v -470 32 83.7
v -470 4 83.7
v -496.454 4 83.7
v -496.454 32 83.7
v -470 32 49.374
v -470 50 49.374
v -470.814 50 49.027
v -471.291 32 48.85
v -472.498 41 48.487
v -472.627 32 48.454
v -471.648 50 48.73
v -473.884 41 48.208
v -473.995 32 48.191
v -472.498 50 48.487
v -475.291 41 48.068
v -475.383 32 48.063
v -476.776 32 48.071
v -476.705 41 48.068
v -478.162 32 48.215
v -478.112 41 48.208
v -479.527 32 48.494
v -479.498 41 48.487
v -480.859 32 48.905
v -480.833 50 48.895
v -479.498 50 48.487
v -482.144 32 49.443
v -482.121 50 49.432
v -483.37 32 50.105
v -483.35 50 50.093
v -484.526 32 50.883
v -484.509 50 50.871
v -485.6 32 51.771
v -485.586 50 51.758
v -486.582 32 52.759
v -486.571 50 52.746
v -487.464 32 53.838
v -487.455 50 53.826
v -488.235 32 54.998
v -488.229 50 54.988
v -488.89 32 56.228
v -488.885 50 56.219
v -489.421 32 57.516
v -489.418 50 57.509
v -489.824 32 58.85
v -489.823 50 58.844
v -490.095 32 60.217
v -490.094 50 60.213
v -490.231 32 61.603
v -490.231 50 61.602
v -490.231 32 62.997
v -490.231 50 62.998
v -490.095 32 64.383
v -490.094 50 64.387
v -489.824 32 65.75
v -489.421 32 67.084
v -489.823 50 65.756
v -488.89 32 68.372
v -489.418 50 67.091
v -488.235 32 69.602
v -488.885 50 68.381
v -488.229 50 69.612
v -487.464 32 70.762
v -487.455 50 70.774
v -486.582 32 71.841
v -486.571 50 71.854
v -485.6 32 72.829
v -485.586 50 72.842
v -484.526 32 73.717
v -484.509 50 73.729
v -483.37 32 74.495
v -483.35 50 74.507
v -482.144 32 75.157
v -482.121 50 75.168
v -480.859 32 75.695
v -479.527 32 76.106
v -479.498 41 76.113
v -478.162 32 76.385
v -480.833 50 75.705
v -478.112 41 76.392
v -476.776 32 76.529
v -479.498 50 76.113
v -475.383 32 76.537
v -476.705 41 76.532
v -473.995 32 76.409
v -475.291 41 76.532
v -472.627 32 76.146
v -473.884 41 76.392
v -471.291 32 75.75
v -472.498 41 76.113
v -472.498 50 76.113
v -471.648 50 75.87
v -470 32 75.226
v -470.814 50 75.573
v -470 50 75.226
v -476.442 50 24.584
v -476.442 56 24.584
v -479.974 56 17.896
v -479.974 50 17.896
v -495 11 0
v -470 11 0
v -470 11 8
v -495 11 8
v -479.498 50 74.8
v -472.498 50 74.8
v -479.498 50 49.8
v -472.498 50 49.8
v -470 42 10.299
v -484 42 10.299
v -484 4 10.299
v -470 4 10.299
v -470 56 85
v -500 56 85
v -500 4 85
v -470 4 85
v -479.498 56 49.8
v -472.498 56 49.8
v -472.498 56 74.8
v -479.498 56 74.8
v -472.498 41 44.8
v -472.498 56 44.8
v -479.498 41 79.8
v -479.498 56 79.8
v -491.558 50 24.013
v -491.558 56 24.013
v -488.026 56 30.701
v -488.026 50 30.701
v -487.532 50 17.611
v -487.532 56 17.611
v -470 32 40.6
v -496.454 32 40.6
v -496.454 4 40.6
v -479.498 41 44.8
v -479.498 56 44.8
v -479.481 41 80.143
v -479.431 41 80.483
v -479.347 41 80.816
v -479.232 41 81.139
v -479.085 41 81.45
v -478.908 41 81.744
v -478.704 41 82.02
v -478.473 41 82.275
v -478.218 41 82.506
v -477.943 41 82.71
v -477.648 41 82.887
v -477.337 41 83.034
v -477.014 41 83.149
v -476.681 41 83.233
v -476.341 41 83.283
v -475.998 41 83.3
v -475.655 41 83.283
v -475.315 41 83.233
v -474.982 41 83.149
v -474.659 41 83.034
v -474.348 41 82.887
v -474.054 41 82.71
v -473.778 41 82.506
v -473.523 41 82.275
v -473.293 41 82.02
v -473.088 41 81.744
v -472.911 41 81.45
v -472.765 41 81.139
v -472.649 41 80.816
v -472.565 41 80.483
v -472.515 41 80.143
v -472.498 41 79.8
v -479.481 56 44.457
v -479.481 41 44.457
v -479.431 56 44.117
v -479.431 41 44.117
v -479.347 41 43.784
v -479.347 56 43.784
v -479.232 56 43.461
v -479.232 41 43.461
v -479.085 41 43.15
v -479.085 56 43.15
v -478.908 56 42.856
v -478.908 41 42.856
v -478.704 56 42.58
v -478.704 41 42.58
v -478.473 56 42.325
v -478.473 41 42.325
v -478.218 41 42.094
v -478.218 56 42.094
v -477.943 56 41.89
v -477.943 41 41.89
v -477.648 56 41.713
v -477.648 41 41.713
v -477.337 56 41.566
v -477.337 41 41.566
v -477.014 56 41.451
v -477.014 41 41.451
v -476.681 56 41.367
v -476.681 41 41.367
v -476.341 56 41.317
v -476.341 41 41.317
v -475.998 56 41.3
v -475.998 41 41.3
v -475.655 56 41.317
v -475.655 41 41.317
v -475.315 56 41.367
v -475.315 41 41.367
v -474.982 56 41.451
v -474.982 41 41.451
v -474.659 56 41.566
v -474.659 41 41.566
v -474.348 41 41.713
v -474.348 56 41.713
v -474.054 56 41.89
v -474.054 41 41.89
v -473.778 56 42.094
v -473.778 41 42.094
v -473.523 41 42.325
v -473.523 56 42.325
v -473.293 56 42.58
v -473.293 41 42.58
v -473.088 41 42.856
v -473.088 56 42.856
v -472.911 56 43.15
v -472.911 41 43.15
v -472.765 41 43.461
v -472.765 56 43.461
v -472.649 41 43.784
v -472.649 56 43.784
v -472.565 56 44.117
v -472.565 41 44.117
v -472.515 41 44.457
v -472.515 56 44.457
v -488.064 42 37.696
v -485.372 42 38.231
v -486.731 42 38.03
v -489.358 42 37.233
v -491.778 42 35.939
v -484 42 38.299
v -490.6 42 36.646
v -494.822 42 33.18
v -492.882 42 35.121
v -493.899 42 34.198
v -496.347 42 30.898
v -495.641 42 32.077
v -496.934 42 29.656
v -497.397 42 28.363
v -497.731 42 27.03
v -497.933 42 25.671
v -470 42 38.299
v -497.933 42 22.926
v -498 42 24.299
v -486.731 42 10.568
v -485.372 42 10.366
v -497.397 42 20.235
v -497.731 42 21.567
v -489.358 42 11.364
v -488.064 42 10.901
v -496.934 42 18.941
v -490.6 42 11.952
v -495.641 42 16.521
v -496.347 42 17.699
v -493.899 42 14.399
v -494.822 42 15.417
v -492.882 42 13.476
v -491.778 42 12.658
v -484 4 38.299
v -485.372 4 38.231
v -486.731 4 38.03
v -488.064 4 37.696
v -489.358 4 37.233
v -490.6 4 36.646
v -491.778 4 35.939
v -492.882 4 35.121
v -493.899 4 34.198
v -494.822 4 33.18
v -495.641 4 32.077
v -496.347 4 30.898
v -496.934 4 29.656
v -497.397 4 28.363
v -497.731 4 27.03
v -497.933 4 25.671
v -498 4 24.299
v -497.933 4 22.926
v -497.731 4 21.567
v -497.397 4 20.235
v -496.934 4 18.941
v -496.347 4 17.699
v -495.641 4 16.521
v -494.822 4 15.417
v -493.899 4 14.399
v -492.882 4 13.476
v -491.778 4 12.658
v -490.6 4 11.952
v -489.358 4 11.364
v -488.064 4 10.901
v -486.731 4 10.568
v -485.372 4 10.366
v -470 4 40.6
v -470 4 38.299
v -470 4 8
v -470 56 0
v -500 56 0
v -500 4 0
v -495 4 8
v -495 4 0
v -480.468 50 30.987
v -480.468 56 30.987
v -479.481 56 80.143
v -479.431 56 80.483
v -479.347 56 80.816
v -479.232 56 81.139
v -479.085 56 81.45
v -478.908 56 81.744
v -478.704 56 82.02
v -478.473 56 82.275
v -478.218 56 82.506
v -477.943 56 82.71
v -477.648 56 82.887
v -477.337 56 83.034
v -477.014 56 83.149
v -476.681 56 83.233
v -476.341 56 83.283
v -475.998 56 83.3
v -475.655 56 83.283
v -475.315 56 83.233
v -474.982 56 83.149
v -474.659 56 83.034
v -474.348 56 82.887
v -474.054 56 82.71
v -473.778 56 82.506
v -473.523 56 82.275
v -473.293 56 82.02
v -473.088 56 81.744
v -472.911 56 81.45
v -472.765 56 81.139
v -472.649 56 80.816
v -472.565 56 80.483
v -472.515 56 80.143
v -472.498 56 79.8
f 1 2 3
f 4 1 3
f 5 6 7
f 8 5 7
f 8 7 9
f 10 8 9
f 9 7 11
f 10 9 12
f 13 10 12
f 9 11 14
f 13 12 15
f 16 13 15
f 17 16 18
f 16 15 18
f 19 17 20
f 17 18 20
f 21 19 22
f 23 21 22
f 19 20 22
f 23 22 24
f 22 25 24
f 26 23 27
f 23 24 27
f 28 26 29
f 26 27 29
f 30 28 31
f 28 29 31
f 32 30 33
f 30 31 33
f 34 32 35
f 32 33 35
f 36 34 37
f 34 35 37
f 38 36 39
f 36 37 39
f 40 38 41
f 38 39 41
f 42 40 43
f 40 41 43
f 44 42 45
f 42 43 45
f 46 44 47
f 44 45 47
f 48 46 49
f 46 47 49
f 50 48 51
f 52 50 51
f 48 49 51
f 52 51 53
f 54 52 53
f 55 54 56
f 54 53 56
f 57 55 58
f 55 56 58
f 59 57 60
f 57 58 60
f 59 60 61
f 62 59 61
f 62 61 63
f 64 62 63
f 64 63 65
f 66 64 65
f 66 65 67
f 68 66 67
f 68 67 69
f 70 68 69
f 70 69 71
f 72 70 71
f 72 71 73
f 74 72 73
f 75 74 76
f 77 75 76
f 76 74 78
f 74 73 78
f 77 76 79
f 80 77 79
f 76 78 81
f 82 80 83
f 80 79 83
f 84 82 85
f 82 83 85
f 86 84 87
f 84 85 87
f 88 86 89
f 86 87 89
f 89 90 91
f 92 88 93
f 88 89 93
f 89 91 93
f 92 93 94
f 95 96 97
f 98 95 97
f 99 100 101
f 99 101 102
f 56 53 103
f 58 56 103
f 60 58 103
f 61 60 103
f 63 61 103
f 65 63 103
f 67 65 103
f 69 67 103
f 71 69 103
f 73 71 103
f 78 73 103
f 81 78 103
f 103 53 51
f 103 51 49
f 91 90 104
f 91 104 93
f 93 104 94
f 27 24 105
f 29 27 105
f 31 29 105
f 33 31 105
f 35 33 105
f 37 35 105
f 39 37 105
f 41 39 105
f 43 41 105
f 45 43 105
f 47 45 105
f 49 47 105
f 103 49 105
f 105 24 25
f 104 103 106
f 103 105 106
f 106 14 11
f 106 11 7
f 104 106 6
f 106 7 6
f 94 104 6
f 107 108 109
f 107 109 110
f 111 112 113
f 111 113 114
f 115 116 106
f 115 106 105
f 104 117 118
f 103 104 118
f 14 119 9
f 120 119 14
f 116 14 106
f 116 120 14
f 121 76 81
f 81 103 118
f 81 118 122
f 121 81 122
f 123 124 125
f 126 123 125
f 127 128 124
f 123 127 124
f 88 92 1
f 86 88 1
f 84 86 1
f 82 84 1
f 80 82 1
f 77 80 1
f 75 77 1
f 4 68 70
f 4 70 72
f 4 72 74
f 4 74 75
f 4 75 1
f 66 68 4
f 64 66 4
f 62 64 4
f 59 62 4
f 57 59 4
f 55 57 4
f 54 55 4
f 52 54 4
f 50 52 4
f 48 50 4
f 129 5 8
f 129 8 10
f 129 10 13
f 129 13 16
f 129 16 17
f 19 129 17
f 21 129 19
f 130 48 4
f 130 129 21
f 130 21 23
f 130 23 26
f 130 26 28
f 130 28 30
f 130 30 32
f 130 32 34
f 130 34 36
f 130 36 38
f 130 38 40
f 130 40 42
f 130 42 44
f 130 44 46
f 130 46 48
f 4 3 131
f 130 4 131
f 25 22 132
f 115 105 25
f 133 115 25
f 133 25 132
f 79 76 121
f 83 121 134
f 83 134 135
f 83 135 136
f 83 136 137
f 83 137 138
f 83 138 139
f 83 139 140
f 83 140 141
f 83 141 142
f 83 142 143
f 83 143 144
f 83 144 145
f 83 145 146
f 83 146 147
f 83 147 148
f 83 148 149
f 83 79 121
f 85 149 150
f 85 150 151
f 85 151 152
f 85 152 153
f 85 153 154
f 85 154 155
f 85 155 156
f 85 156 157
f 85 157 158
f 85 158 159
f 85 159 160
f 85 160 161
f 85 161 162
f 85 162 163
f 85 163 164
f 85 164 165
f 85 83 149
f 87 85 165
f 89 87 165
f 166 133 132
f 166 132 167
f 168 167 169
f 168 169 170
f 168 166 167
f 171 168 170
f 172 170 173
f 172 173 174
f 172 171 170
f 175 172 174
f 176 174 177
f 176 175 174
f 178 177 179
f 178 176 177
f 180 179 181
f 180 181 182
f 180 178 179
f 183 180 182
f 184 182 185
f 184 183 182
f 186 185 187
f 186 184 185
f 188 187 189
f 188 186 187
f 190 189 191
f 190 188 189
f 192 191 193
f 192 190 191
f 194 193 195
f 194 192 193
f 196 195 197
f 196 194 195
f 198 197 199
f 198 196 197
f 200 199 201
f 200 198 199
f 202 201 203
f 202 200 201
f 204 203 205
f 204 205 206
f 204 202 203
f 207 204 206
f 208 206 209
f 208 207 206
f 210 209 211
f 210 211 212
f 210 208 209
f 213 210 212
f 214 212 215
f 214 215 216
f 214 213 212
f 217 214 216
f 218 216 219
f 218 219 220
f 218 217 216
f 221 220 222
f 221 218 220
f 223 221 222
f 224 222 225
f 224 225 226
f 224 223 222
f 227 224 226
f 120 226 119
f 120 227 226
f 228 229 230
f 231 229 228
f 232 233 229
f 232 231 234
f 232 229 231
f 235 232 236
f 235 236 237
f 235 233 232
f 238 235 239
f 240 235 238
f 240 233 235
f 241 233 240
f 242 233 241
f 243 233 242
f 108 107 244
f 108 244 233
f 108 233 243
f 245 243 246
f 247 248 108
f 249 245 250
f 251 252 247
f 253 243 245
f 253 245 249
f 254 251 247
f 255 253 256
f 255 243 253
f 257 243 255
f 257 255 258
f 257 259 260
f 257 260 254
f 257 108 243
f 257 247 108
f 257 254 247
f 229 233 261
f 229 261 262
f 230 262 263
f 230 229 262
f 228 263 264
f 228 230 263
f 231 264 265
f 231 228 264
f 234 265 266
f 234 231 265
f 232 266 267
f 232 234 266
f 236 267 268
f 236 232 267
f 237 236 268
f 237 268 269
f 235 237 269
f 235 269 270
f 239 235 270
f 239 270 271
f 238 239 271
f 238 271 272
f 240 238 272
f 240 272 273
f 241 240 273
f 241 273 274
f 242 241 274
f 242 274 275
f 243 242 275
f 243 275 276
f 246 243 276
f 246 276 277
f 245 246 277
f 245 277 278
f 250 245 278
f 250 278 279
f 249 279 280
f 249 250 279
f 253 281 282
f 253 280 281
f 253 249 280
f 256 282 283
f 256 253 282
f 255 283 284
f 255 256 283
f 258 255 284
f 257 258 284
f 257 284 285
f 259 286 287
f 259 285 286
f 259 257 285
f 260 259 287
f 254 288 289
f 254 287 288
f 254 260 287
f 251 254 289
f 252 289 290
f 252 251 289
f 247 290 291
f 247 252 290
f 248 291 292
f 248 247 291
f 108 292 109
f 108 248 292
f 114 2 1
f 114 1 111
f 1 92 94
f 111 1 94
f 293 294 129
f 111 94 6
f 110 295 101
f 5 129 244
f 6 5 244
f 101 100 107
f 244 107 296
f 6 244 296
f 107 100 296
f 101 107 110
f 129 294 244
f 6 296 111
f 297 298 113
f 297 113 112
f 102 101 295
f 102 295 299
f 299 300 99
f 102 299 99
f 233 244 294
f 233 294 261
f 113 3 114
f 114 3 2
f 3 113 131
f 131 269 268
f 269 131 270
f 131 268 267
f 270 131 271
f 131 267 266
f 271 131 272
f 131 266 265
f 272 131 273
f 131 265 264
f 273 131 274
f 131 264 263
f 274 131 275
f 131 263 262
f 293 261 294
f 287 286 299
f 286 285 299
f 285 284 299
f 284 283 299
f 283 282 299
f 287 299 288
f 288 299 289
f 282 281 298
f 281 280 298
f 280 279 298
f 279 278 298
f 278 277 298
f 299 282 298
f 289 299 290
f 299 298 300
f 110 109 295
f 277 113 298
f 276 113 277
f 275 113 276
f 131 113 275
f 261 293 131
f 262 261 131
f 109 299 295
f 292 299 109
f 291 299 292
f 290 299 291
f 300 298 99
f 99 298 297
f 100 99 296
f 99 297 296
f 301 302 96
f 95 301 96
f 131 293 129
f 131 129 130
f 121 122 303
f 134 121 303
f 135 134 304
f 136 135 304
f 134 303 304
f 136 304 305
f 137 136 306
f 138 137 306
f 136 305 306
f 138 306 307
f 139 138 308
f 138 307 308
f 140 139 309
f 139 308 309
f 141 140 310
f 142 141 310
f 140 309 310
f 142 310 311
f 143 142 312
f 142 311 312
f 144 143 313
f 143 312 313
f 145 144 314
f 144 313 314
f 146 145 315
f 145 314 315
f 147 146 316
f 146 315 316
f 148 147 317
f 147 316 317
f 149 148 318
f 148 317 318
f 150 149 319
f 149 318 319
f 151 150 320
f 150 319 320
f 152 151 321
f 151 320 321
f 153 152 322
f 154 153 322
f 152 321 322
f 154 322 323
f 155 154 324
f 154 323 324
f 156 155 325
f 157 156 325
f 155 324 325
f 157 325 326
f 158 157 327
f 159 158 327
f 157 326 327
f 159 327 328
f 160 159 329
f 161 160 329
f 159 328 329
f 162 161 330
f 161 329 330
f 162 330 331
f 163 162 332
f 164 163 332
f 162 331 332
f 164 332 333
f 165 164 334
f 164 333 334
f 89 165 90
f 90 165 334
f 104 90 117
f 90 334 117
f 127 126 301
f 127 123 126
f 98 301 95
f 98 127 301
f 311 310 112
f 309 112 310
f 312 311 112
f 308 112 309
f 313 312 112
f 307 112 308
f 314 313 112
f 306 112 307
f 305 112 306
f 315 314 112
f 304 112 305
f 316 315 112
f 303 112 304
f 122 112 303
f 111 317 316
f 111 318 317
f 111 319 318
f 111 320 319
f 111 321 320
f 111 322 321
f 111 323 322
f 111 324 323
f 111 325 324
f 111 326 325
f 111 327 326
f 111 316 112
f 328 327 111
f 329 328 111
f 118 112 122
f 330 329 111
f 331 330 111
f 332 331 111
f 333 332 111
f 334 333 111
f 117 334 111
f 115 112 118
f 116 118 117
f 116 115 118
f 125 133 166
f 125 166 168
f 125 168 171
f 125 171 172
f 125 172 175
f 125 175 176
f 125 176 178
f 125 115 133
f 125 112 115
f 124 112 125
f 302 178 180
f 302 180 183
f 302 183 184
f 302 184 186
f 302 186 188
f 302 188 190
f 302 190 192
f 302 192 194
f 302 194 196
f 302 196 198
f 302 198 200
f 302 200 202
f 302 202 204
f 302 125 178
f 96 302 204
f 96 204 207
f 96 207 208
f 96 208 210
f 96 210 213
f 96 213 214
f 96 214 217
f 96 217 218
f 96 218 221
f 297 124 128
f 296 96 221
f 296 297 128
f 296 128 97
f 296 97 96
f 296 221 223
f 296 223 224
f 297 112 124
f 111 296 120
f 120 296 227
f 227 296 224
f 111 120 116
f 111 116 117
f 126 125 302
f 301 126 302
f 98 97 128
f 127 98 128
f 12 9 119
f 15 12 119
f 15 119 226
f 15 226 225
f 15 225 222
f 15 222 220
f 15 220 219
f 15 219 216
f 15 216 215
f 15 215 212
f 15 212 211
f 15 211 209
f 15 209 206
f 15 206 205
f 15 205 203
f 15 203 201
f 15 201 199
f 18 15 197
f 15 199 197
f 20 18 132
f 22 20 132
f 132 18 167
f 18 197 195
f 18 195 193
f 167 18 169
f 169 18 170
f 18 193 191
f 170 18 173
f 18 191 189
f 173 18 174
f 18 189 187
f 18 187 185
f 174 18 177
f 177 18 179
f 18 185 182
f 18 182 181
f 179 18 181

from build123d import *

# Parameters (mm, degrees)
SKETCH1_W           = 30
SKETCH1_H           = 52
BOSS_EXTRUDE1_DEPTH = 85
SKETCH2_R           = 14.25
CUT_EXTRUDE1_DEPTH  = 51
SKETCH3_R           = 11.218089099
CUT_EXTRUDE2_DEPTH  = 27
CUT_EXTRUDE3_DEPTH  = 6
CUT_EXTRUDE4_DEPTH  = 15
SKETCH4_W           = 26.454461606
SKETCH4_H           = 43.1
CUT_EXTRUDE5_DEPTH  = 28
CUT_EXTRUDE6_DEPTH  = 46
SKETCH8_W           = 25
SKETCH8_H           = 7
CUT_EXTRUDE7_DEPTH  = 8


with BuildPart() as part:
    # Sketch1 → Boss-Extrude1 (new body)
    with BuildSketch(Plane.XY):
        with Locations((-485, 30)):
            Rectangle(SKETCH1_W, SKETCH1_H)
    extrude(amount=BOSS_EXTRUDE1_DEPTH)

    # Sketch2 → Cut-Extrude1 (cut)
    with BuildSketch(Plane(origin=(0, 50, 0), x_dir=(1, 0, 0), z_dir=(0, 1, 0))):
        with Locations((-475.99810076, -62.3)):
            Circle(SKETCH2_R)
    extrude(amount=-CUT_EXTRUDE1_DEPTH, mode=Mode.SUBTRACT)

    # Sketch3 → Cut-Extrude2 (cut)
    with BuildSketch(Plane.XZ.offset(-4)):
        with Locations((-483.99810076, 62.3)):
            Circle(SKETCH3_R)
    extrude(amount=-CUT_EXTRUDE2_DEPTH, mode=Mode.SUBTRACT)

    # Sketch5 → Cut-Extrude3 (cut)
    with BuildSketch(Plane(origin=(0, 56, 0), x_dir=(1, 0, 0), z_dir=(0, 1, 0))):
        Polygon((-488.026219091, -30.701179091), (-480.468321914, -30.986702473), (-476.442102823, -24.584133211), (-479.973780909, -17.896040565), (-487.531678086, -17.610517183), (-491.557897177, -24.013086446), align=None)
    extrude(amount=-CUT_EXTRUDE3_DEPTH, mode=Mode.SUBTRACT)

    # Sketch6 → Cut-Extrude4 (cut)
    with BuildSketch(Plane(origin=(0, 56, 0), x_dir=(1, 0, 0), z_dir=(0, 1, 0))):
        with BuildLine():
            Line((-472.49810076, -79.8), (-472.49810076, -74.8))
            Line((-472.49810076, -74.8), (-479.49810076, -74.8))
            Line((-479.49810076, -74.8), (-479.49810076, -79.8))
            ThreePointArc((-479.49810076, -79.8), (-475.99810076, -83.3), (-472.49810076, -79.8))
        make_face()
        with BuildLine():
            Line((-472.49810076, -44.8), (-472.49810076, -49.8))
            Line((-472.49810076, -49.8), (-479.49810076, -49.8))
            Line((-479.49810076, -49.8), (-479.49810076, -44.8))
            ThreePointArc((-479.49810076, -44.8), (-475.99810076, -41.3), (-472.49810076, -44.8))
        make_face()
    extrude(amount=-CUT_EXTRUDE4_DEPTH, mode=Mode.SUBTRACT)

    # Sketch4 → Cut-Extrude5 (cut)
    with BuildSketch(Plane(origin=(0, 4, 0), x_dir=(-1, 0, 0), z_dir=(0, -1, 0))):
        with Locations((483.227230803, -62.15)):
            Rectangle(SKETCH4_W, SKETCH4_H)
    extrude(amount=-CUT_EXTRUDE5_DEPTH, mode=Mode.SUBTRACT)

    # Sketch7 → Cut-Extrude6 (cut)
    with BuildSketch(Plane(origin=(0, 42, 0), x_dir=(1, 0, 0), z_dir=(0, 1, 0))):
        with BuildLine():
            Line((-484, -10.298609828), (-469.568981223, -10.298609828))
            Line((-469.568981223, -10.298609828), (-469.568981223, -38.298609828))
            Line((-469.568981223, -38.298609828), (-484, -38.298609828))
            ThreePointArc((-484, -38.298609828), (-498, -24.298609828), (-484, -10.298609828))
        make_face()
    extrude(amount=-CUT_EXTRUDE6_DEPTH, mode=Mode.SUBTRACT)

    # Sketch8 → Cut-Extrude7 (cut)
    with BuildSketch(Plane(origin=(0, 0, 0), x_dir=(-1, 0, 0), z_dir=(0, 0, -1))):
        with Locations((482.5, 7.5)):
            Rectangle(SKETCH8_W, SKETCH8_H)
    extrude(amount=-CUT_EXTRUDE7_DEPTH, mode=Mode.SUBTRACT)


solid = part.part
